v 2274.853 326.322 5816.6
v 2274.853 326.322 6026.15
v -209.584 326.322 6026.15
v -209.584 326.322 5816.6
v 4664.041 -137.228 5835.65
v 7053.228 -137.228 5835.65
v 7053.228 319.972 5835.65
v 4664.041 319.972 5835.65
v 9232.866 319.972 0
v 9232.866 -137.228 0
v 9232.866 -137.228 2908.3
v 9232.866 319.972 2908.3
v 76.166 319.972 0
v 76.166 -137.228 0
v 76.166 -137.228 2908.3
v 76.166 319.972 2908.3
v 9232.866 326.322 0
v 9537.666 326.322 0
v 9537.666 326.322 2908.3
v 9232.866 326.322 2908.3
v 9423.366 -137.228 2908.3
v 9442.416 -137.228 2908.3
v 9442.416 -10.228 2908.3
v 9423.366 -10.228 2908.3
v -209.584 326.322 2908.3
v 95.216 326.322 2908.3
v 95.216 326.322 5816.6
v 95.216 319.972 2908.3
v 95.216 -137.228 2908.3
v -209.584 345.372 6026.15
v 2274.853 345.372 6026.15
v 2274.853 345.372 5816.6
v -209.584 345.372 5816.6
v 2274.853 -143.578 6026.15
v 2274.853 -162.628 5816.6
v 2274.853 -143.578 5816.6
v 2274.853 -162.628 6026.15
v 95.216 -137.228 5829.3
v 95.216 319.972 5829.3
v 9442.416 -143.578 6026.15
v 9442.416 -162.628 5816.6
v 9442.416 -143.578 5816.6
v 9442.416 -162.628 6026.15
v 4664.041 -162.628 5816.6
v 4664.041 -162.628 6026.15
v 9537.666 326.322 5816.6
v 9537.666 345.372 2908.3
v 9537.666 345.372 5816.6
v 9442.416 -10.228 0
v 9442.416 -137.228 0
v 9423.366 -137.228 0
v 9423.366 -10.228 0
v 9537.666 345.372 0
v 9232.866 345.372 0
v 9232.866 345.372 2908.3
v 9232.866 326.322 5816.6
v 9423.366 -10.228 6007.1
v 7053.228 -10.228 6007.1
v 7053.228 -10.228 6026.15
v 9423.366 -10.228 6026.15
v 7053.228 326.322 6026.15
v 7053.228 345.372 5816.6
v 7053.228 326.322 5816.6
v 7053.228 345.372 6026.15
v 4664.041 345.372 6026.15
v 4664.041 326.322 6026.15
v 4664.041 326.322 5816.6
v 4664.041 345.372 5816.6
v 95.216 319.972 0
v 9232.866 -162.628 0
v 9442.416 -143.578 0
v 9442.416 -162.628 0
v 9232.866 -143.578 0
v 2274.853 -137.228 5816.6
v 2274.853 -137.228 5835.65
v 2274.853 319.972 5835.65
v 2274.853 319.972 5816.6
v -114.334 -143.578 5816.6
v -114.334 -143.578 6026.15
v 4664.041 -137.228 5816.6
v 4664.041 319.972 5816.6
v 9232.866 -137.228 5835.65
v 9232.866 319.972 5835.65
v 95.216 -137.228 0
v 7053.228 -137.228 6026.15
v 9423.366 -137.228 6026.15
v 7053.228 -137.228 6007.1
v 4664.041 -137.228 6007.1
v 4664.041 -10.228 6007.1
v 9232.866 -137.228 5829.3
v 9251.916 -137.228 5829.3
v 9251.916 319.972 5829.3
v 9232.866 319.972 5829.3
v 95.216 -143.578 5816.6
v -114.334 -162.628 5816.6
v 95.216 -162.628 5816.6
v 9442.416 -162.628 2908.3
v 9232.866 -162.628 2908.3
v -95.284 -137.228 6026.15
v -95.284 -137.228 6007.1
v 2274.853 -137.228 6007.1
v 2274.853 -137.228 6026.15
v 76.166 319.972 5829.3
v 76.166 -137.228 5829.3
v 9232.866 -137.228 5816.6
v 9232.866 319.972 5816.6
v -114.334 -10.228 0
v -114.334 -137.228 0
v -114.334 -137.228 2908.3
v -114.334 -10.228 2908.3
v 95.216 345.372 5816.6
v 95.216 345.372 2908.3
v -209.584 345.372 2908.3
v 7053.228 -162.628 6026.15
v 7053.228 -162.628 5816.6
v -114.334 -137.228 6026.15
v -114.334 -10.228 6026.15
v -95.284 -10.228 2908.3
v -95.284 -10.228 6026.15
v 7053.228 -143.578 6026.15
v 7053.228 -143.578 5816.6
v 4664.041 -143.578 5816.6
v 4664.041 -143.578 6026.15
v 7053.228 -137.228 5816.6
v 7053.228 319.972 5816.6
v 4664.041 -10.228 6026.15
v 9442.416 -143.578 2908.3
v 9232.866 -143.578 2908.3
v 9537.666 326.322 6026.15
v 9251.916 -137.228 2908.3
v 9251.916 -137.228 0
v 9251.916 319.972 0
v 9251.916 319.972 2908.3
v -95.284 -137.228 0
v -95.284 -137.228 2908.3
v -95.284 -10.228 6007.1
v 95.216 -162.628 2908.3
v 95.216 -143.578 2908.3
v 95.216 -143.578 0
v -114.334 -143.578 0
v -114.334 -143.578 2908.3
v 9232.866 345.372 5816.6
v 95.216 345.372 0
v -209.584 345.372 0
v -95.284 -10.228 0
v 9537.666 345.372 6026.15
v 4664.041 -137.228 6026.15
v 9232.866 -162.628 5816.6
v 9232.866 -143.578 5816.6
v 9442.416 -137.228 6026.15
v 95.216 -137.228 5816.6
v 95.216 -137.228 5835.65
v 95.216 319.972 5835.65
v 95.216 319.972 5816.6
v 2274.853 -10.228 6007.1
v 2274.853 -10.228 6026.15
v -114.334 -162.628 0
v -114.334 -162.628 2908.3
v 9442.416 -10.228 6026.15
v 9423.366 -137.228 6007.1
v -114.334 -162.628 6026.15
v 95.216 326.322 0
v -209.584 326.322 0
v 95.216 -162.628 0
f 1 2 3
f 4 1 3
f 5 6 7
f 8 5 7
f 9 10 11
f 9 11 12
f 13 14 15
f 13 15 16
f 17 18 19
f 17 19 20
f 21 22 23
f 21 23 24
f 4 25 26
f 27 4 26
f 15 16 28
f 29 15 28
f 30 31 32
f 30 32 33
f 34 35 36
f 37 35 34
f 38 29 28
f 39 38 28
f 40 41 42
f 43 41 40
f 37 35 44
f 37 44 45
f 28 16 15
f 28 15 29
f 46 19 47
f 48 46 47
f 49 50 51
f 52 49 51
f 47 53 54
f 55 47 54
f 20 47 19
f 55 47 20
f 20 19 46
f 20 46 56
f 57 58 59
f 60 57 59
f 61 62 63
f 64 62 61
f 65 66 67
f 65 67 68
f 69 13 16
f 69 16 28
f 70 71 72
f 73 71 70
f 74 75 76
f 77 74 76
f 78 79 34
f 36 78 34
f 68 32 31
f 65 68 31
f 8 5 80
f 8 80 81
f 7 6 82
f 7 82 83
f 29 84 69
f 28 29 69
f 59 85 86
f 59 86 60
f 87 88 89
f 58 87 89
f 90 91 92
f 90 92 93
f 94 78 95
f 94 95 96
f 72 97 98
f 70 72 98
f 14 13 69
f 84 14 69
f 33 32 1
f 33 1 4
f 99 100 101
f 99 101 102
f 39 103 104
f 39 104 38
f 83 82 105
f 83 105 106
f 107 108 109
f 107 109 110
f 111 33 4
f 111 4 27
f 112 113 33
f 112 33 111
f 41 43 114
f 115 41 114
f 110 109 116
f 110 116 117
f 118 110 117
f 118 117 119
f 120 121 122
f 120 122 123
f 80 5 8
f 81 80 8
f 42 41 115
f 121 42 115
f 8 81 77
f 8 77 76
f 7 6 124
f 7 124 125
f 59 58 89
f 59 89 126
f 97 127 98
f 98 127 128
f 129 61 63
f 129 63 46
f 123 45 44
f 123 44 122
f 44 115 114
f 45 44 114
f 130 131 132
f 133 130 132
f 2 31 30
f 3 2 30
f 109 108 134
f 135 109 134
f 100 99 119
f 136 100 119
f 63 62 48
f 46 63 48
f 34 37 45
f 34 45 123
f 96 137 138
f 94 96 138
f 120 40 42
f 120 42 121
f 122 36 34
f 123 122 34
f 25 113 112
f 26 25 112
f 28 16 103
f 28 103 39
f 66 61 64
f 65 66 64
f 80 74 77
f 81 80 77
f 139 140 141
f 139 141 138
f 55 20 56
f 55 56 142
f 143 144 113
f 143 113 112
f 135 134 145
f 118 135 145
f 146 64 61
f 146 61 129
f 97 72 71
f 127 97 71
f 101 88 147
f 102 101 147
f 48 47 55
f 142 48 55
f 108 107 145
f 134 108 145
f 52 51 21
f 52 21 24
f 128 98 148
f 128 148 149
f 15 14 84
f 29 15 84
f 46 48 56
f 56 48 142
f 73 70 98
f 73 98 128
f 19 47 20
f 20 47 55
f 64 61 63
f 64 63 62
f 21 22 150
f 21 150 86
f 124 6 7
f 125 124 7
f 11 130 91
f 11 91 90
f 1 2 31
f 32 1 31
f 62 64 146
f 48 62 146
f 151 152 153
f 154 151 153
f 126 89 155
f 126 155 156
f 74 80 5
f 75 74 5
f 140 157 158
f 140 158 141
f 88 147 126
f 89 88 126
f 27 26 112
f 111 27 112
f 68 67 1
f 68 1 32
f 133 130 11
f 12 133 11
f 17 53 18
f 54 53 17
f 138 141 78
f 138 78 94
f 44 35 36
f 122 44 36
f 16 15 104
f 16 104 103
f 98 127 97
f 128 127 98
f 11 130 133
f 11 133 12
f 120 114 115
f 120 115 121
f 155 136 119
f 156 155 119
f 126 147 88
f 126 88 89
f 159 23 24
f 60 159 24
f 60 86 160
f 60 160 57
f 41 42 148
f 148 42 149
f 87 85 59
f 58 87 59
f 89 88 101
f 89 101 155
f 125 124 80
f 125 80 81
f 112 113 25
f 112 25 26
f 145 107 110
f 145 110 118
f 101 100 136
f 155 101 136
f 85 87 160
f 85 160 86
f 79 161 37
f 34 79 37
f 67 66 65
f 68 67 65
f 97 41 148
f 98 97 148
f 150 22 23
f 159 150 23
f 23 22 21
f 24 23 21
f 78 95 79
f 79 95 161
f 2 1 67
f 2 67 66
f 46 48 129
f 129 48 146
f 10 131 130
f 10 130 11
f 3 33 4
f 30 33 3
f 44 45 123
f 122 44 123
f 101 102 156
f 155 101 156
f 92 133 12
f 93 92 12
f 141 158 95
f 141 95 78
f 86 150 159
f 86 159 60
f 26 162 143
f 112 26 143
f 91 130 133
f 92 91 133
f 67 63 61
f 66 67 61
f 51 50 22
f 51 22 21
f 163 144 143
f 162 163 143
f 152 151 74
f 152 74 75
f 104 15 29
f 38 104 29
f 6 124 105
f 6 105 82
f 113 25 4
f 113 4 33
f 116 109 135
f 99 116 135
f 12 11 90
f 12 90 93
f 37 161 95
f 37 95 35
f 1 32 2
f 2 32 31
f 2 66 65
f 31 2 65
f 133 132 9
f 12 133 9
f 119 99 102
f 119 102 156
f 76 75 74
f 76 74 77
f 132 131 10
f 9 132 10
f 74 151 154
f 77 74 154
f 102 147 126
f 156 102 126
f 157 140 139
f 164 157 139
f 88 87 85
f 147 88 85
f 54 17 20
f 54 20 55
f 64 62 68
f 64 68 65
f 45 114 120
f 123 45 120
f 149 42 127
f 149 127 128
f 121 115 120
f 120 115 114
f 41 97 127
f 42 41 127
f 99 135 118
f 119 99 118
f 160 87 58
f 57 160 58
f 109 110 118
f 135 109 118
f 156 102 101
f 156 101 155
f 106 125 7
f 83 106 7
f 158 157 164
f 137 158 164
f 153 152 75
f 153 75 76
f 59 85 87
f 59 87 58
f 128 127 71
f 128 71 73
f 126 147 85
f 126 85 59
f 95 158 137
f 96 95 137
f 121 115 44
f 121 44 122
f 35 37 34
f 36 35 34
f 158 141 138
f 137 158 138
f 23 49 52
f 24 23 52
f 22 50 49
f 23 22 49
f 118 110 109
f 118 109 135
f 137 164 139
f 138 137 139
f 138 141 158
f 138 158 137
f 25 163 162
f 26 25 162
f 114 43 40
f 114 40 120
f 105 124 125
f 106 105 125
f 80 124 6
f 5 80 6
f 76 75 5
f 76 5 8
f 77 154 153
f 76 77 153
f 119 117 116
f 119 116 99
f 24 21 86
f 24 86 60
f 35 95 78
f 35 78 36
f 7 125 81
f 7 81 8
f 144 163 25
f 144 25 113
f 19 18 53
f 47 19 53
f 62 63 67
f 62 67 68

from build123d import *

# Parameters (mm, degrees)
F0_W      = 19.05
F0_H      = 127
F0_W_2    = 209.55
F0_H_2    = 19.05
F0_H_3    = 457.2
F0_W_3    = 304.8
F1_DEPTH  = 2908.3
F2_W      = 209.55
F2_H      = 19.05
F2_W_2    = 304.8
F3_DEPTH  = 2908.3
F4_W      = 19.05
F4_H      = 127
F5_DEPTH  = 3117.85
F6_W      = 19.05
F6_H      = 457.2
F7_DEPTH  = 2921
F9_W      = 127
F9_H      = 19.05
F10_DEPTH = 2370.1375
F11_W     = 2389.1875
F11_H     = 209.55
F12_DEPTH = 19.05
F13_W     = 457.2
F13_H     = 19.05
F14_DEPTH = 2179.6375
F15_W     = 2484.4375
F15_H     = 209.55
F16_DEPTH = 19.05
F17_W     = 127
F17_H     = 19.05
F17_W_2   = 457.2
F17_W_3   = 19.05
F17_H_2   = 209.55
F18_DEPTH = 2389.1875


with BuildPart() as f1:
    # F0 (on Top) → F1 (new body)
    with BuildSketch(Plane.XY):
        with Locations((-104.809374, -73.728366)):
            Rectangle(F0_W, F0_H)
        with Locations((-9.559374, -153.103366)):
            Rectangle(F0_W_2, F0_H_2)
        with Locations((85.690626, 91.371634)):
            Rectangle(F0_W, F0_H_3)
        with Locations((-57.184374, 335.846634)):
            Rectangle(F0_W_3, F0_H_2)
    extrude(amount=F1_DEPTH)


with BuildPart() as f3:
    # F2 (on face) → F3 (new body)
    with BuildSketch(Plane.XY.offset(2908.3)):
        with Locations((-9.559374, -153.103366)):
            Rectangle(F2_W, F2_H)
        with Locations((-57.184374, 335.846634)):
            Rectangle(F2_W_2, F2_H)
    extrude(amount=F3_DEPTH)


with BuildPart() as f5:
    # F4 (on face) → F5 (new body)
    with BuildSketch(Plane.XY.offset(2908.3)):
        with Locations((-104.809374, -73.728366)):
            Rectangle(F4_W, F4_H)
    extrude(amount=F5_DEPTH)


with BuildPart() as f7:
    # F6 (on face) → F7 (new body)
    with BuildSketch(Plane.XY.offset(2908.3)):
        with Locations((85.690626, 91.371634)):
            Rectangle(F6_W, F6_H)
    extrude(amount=F7_DEPTH)


with BuildPart() as f10:
    # F9 (on face) → F10 (new body, through all)
    with BuildSketch(Plane.YZ.offset(-95.284374)):
        with Locations((-73.728366, 6016.625)):
            Rectangle(F9_W, F9_H)
    extrude(amount=F10_DEPTH)


with BuildPart() as f12:
    # F11 (on face) → F12 (new body)
    with BuildSketch(Plane.XZ.offset(162.628366)):
        with Locations((1080.259376, 5921.375)):
            Rectangle(F11_W, F11_H)
    extrude(amount=-F12_DEPTH)


with BuildPart() as f14:
    # F13 (on face) → F14 (new body, through all)
    with BuildSketch(Plane.YZ.offset(95.215626)):
        with Locations((91.371634, 5826.125)):
            Rectangle(F13_W, F13_H)
    extrude(amount=F14_DEPTH)


with BuildPart() as f16:
    # F15 (on face) → F16 (new body)
    with BuildSketch(Plane(origin=(0, 345.371634, 0), x_dir=(-1, 0, 0), z_dir=(0, 1, 0))):
        with Locations((-1032.634376, 5921.375)):
            Rectangle(F15_W, F15_H)
    extrude(amount=-F16_DEPTH)


with BuildPart() as f18:
    # F17 (on face) → F18 (new body)
    with BuildSketch(Plane.YZ.offset(2274.853126)):
        with Locations((-73.728366, 6016.625)):
            Rectangle(F17_W, F17_H)
        with Locations((91.371634, 5826.125)):
            Rectangle(F17_W_2, F17_H)
        with Locations((335.846634, 5921.375)):
            Rectangle(F17_W_3, F17_H_2)
        with Locations((-153.103366, 5921.375)):
            Rectangle(F17_W_3, F17_H_2)
    extrude(amount=F18_DEPTH)


with BuildPart() as f19_1:
    # F19: instance of F10
    add(f10.part.mirror(Plane(origin=(4664.040626, -153.103366, 5921.375), x_dir=(0, 1, 0), z_dir=(1, 0, 0))))


with BuildPart() as f19_2:
    # F19: instance of F14
    add(f14.part.mirror(Plane(origin=(4664.040626, -153.103366, 5921.375), x_dir=(0, 1, 0), z_dir=(1, 0, 0))))


with BuildPart() as f19_3:
    # F19: instance of F3
    add(f3.part.mirror(Plane(origin=(4664.040626, -153.103366, 5921.375), x_dir=(0, 1, 0), z_dir=(1, 0, 0))))


with BuildPart() as f19_4:
    # F19: instance of F16
    add(f16.part.mirror(Plane(origin=(4664.040626, -153.103366, 5921.375), x_dir=(0, 1, 0), z_dir=(1, 0, 0))))


with BuildPart() as f19_5:
    # F19: instance of F12
    add(f12.part.mirror(Plane(origin=(4664.040626, -153.103366, 5921.375), x_dir=(0, 1, 0), z_dir=(1, 0, 0))))


with BuildPart() as f19_6:
    # F19: instance of F5
    add(f5.part.mirror(Plane(origin=(4664.040626, -153.103366, 5921.375), x_dir=(0, 1, 0), z_dir=(1, 0, 0))))


with BuildPart() as f19_7:
    # F19: instance of F1
    add(f1.part.mirror(Plane(origin=(4664.040626, -153.103366, 5921.375), x_dir=(0, 1, 0), z_dir=(1, 0, 0))))


with BuildPart() as f19_8:
    # F19: instance of F7
    add(f7.part.mirror(Plane(origin=(4664.040626, -153.103366, 5921.375), x_dir=(0, 1, 0), z_dir=(1, 0, 0))))


with BuildPart() as f19_9:
    # F19: instance of F18
    add(f18.part.mirror(Plane(origin=(4664.040626, -153.103366, 5921.375), x_dir=(0, 1, 0), z_dir=(1, 0, 0))))


solid = Compound([f1.part, f3.part, f5.part, f7.part, f10.part, f12.part, f14.part, f16.part, f18.part, f19_1.part, f19_2.part, f19_3.part, f19_4.part, f19_5.part, f19_6.part, f19_7.part, f19_8.part, f19_9.part])
